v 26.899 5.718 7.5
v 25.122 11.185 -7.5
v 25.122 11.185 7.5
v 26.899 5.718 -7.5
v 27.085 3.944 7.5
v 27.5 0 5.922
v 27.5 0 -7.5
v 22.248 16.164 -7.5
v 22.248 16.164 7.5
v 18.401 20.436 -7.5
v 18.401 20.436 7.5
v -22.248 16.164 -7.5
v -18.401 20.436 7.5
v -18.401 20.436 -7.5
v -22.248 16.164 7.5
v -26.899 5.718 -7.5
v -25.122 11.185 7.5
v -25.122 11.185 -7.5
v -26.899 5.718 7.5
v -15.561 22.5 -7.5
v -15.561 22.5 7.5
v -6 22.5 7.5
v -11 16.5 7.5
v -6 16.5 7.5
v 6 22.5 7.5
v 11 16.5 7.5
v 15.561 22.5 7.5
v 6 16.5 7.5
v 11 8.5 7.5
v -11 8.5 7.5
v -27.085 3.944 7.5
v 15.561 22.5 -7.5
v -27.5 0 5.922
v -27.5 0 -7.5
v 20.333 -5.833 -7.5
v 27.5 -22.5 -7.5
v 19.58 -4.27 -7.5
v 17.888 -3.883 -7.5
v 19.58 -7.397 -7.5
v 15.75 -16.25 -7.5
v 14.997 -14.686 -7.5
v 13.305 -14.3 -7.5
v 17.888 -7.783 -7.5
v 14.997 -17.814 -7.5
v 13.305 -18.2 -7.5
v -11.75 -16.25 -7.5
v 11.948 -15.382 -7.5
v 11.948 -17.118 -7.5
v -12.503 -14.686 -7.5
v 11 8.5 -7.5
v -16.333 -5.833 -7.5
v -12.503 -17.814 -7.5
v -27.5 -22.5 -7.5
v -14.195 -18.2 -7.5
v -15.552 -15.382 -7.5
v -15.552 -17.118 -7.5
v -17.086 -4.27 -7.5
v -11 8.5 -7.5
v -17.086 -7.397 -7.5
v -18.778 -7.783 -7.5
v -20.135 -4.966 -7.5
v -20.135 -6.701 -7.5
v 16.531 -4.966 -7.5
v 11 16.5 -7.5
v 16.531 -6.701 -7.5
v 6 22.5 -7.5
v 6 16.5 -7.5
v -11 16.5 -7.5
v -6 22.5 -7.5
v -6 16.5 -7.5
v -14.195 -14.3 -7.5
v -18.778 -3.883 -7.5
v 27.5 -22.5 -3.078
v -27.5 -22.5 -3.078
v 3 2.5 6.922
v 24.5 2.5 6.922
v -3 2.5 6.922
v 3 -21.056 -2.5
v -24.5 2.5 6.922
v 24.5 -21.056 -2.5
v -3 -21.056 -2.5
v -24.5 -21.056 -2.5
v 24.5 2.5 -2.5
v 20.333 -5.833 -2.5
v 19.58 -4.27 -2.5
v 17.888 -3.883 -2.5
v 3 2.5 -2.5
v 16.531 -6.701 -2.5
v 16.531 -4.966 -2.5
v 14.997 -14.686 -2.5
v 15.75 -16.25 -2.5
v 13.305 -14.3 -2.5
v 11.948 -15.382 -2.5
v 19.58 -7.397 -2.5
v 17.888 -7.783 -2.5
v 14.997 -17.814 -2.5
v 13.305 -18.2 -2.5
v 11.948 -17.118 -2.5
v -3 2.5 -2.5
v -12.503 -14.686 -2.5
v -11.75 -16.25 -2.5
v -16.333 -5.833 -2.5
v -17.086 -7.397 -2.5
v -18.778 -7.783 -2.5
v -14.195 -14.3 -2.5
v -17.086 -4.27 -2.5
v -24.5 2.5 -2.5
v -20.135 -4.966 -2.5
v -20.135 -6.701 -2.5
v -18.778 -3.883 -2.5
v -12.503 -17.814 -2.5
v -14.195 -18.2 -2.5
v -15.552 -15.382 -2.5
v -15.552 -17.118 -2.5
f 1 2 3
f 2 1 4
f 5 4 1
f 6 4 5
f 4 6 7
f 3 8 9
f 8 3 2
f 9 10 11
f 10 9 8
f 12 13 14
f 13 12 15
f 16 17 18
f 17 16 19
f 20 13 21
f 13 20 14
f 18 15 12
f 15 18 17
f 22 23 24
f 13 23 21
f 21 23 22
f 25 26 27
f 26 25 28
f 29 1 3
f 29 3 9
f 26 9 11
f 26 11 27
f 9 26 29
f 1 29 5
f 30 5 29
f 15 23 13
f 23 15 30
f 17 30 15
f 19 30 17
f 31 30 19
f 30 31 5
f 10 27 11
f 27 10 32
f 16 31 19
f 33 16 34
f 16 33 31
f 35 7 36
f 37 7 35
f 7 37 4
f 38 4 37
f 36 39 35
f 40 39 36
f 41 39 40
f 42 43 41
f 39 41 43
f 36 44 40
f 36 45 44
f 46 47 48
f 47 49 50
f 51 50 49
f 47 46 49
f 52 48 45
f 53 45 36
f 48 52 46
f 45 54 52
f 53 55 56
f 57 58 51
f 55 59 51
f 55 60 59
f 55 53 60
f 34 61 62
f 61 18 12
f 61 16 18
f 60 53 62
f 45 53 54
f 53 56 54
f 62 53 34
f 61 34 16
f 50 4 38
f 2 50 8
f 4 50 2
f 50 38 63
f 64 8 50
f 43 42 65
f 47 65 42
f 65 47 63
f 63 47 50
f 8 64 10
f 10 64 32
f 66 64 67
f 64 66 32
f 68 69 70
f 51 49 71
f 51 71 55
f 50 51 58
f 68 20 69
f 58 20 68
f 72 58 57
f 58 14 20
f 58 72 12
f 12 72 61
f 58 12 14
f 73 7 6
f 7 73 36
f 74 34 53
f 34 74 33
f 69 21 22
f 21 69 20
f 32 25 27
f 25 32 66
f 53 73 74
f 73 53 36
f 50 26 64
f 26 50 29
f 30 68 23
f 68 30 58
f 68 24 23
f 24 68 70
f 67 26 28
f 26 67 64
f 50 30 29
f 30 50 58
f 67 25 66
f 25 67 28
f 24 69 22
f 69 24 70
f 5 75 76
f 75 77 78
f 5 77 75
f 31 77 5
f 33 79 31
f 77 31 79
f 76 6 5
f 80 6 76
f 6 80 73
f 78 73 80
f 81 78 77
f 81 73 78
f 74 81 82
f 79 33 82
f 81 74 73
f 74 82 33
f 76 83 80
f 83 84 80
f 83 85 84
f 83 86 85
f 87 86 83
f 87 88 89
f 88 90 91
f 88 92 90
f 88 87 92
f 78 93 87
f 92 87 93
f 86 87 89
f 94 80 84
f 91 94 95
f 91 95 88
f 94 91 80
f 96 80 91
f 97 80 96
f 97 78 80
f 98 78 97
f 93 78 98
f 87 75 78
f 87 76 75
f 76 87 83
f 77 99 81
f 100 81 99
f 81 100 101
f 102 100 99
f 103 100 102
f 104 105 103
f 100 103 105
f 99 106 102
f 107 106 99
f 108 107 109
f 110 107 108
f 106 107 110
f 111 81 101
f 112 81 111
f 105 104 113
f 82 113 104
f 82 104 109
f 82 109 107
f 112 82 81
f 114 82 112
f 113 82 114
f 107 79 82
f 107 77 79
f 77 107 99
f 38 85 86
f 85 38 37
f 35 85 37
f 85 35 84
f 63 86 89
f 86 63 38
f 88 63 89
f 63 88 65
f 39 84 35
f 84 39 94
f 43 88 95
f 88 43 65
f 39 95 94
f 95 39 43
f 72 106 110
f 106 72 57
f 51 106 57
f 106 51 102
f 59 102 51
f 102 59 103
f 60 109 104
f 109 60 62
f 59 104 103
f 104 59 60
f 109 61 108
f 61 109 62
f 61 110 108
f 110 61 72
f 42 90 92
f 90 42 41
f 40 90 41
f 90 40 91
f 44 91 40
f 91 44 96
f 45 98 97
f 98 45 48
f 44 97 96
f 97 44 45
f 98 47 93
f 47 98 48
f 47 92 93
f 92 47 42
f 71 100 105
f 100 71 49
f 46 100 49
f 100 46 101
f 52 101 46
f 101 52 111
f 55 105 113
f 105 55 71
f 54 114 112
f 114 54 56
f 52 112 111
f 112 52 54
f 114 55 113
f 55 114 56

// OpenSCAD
//********************************************************************
// Customizable Drawer Guide Bracket 
// By James Newton
//********************************************************************


//********************************************************************
//User defined parameters
//********************************************************************
//Width of guide.
guideWidth = 22;

//Height of guide.
guideHeight = 8;

//Distance between guide and ceiling of drawer slot
guideClearance = 6;

//Width of the guide mount or space between the top "fingers" of the bracket.
guideMount = 12;

//Width of Bracket (must be wider than guide)
bracketWidth = 55; 

bracketHeight = 45;

bracketDepth = 15;

bracketThickness = 5;

screwDiameter = 4;

//********************************************************************
bracketBelowShelf=(bracketHeight-guideClearance*2-guideHeight);
intersection() {

	// Remove extra material from the "fingers" at the top.
	union() {
		cylinder(h=bracketDepth,r=bracketWidth/2,center=true);
		//but don't take anything off the bottom. 
		translate([0,-bracketHeight/2,0])
			cube([bracketWidth,bracketHeight,bracketDepth], center=true);
		}
	
	difference() {
		//base plate
		cube([bracketWidth,bracketHeight,bracketDepth], center=true);
		
		// cutout for guide
		translate([0,bracketHeight/2-guideClearance-guideHeight/2,0])
			cube([guideWidth,guideHeight,bracketDepth*2], center=true);
	
		// cutout for guide mount
		translate([0,bracketHeight/2-guideClearance/2,0])
			cube([guideMount,guideClearance+1,bracketDepth*2], center=true);
	
		// slope the attachment to the guide holder
		translate([0,-bracketHeight/2,bracketThickness]) 
		rotate([atan((bracketDepth-bracketThickness)/bracketBelowShelf),0,0])
			cube([bracketWidth+1,bracketHeight*2,bracketDepth], center=true);
	
		// Remove unneeded material from the attachment, leaving center and side buttresses
		translate([guideClearance/2,-bracketHeight/2,-bracketDepth/2+bracketThickness]) 
			cube([bracketWidth/2-guideClearance, bracketBelowShelf, bracketDepth]);
		translate([-bracketWidth/2+guideClearance/2,-bracketHeight/2,-bracketDepth/2+bracketThickness]) 
			cube([bracketWidth/2-guideClearance, bracketBelowShelf, bracketDepth]);
	
		// Screw holes
		translate([bracketWidth*2/6,-(bracketHeight/2)+(bracketBelowShelf*2/3),0]) 
			cylinder(h=bracketDepth+1,r=screwDiameter/2,center=true);
		translate([-bracketWidth*2/6,-(bracketHeight/2)+(bracketBelowShelf*2/3),0]) 
			cylinder(h=bracketDepth+1,r=screwDiameter/2,center=true);
		translate([bracketWidth*1/4,-(bracketHeight/2)+(bracketBelowShelf*1/4),0]) 
			cylinder(h=bracketDepth+1,r=screwDiameter/2,center=true);
		translate([-bracketWidth*1/4,-(bracketHeight/2)+(bracketBelowShelf*1/4),0]) 
			cylinder(h=bracketDepth+1,r=screwDiameter/2,center=true);
		}
	}
